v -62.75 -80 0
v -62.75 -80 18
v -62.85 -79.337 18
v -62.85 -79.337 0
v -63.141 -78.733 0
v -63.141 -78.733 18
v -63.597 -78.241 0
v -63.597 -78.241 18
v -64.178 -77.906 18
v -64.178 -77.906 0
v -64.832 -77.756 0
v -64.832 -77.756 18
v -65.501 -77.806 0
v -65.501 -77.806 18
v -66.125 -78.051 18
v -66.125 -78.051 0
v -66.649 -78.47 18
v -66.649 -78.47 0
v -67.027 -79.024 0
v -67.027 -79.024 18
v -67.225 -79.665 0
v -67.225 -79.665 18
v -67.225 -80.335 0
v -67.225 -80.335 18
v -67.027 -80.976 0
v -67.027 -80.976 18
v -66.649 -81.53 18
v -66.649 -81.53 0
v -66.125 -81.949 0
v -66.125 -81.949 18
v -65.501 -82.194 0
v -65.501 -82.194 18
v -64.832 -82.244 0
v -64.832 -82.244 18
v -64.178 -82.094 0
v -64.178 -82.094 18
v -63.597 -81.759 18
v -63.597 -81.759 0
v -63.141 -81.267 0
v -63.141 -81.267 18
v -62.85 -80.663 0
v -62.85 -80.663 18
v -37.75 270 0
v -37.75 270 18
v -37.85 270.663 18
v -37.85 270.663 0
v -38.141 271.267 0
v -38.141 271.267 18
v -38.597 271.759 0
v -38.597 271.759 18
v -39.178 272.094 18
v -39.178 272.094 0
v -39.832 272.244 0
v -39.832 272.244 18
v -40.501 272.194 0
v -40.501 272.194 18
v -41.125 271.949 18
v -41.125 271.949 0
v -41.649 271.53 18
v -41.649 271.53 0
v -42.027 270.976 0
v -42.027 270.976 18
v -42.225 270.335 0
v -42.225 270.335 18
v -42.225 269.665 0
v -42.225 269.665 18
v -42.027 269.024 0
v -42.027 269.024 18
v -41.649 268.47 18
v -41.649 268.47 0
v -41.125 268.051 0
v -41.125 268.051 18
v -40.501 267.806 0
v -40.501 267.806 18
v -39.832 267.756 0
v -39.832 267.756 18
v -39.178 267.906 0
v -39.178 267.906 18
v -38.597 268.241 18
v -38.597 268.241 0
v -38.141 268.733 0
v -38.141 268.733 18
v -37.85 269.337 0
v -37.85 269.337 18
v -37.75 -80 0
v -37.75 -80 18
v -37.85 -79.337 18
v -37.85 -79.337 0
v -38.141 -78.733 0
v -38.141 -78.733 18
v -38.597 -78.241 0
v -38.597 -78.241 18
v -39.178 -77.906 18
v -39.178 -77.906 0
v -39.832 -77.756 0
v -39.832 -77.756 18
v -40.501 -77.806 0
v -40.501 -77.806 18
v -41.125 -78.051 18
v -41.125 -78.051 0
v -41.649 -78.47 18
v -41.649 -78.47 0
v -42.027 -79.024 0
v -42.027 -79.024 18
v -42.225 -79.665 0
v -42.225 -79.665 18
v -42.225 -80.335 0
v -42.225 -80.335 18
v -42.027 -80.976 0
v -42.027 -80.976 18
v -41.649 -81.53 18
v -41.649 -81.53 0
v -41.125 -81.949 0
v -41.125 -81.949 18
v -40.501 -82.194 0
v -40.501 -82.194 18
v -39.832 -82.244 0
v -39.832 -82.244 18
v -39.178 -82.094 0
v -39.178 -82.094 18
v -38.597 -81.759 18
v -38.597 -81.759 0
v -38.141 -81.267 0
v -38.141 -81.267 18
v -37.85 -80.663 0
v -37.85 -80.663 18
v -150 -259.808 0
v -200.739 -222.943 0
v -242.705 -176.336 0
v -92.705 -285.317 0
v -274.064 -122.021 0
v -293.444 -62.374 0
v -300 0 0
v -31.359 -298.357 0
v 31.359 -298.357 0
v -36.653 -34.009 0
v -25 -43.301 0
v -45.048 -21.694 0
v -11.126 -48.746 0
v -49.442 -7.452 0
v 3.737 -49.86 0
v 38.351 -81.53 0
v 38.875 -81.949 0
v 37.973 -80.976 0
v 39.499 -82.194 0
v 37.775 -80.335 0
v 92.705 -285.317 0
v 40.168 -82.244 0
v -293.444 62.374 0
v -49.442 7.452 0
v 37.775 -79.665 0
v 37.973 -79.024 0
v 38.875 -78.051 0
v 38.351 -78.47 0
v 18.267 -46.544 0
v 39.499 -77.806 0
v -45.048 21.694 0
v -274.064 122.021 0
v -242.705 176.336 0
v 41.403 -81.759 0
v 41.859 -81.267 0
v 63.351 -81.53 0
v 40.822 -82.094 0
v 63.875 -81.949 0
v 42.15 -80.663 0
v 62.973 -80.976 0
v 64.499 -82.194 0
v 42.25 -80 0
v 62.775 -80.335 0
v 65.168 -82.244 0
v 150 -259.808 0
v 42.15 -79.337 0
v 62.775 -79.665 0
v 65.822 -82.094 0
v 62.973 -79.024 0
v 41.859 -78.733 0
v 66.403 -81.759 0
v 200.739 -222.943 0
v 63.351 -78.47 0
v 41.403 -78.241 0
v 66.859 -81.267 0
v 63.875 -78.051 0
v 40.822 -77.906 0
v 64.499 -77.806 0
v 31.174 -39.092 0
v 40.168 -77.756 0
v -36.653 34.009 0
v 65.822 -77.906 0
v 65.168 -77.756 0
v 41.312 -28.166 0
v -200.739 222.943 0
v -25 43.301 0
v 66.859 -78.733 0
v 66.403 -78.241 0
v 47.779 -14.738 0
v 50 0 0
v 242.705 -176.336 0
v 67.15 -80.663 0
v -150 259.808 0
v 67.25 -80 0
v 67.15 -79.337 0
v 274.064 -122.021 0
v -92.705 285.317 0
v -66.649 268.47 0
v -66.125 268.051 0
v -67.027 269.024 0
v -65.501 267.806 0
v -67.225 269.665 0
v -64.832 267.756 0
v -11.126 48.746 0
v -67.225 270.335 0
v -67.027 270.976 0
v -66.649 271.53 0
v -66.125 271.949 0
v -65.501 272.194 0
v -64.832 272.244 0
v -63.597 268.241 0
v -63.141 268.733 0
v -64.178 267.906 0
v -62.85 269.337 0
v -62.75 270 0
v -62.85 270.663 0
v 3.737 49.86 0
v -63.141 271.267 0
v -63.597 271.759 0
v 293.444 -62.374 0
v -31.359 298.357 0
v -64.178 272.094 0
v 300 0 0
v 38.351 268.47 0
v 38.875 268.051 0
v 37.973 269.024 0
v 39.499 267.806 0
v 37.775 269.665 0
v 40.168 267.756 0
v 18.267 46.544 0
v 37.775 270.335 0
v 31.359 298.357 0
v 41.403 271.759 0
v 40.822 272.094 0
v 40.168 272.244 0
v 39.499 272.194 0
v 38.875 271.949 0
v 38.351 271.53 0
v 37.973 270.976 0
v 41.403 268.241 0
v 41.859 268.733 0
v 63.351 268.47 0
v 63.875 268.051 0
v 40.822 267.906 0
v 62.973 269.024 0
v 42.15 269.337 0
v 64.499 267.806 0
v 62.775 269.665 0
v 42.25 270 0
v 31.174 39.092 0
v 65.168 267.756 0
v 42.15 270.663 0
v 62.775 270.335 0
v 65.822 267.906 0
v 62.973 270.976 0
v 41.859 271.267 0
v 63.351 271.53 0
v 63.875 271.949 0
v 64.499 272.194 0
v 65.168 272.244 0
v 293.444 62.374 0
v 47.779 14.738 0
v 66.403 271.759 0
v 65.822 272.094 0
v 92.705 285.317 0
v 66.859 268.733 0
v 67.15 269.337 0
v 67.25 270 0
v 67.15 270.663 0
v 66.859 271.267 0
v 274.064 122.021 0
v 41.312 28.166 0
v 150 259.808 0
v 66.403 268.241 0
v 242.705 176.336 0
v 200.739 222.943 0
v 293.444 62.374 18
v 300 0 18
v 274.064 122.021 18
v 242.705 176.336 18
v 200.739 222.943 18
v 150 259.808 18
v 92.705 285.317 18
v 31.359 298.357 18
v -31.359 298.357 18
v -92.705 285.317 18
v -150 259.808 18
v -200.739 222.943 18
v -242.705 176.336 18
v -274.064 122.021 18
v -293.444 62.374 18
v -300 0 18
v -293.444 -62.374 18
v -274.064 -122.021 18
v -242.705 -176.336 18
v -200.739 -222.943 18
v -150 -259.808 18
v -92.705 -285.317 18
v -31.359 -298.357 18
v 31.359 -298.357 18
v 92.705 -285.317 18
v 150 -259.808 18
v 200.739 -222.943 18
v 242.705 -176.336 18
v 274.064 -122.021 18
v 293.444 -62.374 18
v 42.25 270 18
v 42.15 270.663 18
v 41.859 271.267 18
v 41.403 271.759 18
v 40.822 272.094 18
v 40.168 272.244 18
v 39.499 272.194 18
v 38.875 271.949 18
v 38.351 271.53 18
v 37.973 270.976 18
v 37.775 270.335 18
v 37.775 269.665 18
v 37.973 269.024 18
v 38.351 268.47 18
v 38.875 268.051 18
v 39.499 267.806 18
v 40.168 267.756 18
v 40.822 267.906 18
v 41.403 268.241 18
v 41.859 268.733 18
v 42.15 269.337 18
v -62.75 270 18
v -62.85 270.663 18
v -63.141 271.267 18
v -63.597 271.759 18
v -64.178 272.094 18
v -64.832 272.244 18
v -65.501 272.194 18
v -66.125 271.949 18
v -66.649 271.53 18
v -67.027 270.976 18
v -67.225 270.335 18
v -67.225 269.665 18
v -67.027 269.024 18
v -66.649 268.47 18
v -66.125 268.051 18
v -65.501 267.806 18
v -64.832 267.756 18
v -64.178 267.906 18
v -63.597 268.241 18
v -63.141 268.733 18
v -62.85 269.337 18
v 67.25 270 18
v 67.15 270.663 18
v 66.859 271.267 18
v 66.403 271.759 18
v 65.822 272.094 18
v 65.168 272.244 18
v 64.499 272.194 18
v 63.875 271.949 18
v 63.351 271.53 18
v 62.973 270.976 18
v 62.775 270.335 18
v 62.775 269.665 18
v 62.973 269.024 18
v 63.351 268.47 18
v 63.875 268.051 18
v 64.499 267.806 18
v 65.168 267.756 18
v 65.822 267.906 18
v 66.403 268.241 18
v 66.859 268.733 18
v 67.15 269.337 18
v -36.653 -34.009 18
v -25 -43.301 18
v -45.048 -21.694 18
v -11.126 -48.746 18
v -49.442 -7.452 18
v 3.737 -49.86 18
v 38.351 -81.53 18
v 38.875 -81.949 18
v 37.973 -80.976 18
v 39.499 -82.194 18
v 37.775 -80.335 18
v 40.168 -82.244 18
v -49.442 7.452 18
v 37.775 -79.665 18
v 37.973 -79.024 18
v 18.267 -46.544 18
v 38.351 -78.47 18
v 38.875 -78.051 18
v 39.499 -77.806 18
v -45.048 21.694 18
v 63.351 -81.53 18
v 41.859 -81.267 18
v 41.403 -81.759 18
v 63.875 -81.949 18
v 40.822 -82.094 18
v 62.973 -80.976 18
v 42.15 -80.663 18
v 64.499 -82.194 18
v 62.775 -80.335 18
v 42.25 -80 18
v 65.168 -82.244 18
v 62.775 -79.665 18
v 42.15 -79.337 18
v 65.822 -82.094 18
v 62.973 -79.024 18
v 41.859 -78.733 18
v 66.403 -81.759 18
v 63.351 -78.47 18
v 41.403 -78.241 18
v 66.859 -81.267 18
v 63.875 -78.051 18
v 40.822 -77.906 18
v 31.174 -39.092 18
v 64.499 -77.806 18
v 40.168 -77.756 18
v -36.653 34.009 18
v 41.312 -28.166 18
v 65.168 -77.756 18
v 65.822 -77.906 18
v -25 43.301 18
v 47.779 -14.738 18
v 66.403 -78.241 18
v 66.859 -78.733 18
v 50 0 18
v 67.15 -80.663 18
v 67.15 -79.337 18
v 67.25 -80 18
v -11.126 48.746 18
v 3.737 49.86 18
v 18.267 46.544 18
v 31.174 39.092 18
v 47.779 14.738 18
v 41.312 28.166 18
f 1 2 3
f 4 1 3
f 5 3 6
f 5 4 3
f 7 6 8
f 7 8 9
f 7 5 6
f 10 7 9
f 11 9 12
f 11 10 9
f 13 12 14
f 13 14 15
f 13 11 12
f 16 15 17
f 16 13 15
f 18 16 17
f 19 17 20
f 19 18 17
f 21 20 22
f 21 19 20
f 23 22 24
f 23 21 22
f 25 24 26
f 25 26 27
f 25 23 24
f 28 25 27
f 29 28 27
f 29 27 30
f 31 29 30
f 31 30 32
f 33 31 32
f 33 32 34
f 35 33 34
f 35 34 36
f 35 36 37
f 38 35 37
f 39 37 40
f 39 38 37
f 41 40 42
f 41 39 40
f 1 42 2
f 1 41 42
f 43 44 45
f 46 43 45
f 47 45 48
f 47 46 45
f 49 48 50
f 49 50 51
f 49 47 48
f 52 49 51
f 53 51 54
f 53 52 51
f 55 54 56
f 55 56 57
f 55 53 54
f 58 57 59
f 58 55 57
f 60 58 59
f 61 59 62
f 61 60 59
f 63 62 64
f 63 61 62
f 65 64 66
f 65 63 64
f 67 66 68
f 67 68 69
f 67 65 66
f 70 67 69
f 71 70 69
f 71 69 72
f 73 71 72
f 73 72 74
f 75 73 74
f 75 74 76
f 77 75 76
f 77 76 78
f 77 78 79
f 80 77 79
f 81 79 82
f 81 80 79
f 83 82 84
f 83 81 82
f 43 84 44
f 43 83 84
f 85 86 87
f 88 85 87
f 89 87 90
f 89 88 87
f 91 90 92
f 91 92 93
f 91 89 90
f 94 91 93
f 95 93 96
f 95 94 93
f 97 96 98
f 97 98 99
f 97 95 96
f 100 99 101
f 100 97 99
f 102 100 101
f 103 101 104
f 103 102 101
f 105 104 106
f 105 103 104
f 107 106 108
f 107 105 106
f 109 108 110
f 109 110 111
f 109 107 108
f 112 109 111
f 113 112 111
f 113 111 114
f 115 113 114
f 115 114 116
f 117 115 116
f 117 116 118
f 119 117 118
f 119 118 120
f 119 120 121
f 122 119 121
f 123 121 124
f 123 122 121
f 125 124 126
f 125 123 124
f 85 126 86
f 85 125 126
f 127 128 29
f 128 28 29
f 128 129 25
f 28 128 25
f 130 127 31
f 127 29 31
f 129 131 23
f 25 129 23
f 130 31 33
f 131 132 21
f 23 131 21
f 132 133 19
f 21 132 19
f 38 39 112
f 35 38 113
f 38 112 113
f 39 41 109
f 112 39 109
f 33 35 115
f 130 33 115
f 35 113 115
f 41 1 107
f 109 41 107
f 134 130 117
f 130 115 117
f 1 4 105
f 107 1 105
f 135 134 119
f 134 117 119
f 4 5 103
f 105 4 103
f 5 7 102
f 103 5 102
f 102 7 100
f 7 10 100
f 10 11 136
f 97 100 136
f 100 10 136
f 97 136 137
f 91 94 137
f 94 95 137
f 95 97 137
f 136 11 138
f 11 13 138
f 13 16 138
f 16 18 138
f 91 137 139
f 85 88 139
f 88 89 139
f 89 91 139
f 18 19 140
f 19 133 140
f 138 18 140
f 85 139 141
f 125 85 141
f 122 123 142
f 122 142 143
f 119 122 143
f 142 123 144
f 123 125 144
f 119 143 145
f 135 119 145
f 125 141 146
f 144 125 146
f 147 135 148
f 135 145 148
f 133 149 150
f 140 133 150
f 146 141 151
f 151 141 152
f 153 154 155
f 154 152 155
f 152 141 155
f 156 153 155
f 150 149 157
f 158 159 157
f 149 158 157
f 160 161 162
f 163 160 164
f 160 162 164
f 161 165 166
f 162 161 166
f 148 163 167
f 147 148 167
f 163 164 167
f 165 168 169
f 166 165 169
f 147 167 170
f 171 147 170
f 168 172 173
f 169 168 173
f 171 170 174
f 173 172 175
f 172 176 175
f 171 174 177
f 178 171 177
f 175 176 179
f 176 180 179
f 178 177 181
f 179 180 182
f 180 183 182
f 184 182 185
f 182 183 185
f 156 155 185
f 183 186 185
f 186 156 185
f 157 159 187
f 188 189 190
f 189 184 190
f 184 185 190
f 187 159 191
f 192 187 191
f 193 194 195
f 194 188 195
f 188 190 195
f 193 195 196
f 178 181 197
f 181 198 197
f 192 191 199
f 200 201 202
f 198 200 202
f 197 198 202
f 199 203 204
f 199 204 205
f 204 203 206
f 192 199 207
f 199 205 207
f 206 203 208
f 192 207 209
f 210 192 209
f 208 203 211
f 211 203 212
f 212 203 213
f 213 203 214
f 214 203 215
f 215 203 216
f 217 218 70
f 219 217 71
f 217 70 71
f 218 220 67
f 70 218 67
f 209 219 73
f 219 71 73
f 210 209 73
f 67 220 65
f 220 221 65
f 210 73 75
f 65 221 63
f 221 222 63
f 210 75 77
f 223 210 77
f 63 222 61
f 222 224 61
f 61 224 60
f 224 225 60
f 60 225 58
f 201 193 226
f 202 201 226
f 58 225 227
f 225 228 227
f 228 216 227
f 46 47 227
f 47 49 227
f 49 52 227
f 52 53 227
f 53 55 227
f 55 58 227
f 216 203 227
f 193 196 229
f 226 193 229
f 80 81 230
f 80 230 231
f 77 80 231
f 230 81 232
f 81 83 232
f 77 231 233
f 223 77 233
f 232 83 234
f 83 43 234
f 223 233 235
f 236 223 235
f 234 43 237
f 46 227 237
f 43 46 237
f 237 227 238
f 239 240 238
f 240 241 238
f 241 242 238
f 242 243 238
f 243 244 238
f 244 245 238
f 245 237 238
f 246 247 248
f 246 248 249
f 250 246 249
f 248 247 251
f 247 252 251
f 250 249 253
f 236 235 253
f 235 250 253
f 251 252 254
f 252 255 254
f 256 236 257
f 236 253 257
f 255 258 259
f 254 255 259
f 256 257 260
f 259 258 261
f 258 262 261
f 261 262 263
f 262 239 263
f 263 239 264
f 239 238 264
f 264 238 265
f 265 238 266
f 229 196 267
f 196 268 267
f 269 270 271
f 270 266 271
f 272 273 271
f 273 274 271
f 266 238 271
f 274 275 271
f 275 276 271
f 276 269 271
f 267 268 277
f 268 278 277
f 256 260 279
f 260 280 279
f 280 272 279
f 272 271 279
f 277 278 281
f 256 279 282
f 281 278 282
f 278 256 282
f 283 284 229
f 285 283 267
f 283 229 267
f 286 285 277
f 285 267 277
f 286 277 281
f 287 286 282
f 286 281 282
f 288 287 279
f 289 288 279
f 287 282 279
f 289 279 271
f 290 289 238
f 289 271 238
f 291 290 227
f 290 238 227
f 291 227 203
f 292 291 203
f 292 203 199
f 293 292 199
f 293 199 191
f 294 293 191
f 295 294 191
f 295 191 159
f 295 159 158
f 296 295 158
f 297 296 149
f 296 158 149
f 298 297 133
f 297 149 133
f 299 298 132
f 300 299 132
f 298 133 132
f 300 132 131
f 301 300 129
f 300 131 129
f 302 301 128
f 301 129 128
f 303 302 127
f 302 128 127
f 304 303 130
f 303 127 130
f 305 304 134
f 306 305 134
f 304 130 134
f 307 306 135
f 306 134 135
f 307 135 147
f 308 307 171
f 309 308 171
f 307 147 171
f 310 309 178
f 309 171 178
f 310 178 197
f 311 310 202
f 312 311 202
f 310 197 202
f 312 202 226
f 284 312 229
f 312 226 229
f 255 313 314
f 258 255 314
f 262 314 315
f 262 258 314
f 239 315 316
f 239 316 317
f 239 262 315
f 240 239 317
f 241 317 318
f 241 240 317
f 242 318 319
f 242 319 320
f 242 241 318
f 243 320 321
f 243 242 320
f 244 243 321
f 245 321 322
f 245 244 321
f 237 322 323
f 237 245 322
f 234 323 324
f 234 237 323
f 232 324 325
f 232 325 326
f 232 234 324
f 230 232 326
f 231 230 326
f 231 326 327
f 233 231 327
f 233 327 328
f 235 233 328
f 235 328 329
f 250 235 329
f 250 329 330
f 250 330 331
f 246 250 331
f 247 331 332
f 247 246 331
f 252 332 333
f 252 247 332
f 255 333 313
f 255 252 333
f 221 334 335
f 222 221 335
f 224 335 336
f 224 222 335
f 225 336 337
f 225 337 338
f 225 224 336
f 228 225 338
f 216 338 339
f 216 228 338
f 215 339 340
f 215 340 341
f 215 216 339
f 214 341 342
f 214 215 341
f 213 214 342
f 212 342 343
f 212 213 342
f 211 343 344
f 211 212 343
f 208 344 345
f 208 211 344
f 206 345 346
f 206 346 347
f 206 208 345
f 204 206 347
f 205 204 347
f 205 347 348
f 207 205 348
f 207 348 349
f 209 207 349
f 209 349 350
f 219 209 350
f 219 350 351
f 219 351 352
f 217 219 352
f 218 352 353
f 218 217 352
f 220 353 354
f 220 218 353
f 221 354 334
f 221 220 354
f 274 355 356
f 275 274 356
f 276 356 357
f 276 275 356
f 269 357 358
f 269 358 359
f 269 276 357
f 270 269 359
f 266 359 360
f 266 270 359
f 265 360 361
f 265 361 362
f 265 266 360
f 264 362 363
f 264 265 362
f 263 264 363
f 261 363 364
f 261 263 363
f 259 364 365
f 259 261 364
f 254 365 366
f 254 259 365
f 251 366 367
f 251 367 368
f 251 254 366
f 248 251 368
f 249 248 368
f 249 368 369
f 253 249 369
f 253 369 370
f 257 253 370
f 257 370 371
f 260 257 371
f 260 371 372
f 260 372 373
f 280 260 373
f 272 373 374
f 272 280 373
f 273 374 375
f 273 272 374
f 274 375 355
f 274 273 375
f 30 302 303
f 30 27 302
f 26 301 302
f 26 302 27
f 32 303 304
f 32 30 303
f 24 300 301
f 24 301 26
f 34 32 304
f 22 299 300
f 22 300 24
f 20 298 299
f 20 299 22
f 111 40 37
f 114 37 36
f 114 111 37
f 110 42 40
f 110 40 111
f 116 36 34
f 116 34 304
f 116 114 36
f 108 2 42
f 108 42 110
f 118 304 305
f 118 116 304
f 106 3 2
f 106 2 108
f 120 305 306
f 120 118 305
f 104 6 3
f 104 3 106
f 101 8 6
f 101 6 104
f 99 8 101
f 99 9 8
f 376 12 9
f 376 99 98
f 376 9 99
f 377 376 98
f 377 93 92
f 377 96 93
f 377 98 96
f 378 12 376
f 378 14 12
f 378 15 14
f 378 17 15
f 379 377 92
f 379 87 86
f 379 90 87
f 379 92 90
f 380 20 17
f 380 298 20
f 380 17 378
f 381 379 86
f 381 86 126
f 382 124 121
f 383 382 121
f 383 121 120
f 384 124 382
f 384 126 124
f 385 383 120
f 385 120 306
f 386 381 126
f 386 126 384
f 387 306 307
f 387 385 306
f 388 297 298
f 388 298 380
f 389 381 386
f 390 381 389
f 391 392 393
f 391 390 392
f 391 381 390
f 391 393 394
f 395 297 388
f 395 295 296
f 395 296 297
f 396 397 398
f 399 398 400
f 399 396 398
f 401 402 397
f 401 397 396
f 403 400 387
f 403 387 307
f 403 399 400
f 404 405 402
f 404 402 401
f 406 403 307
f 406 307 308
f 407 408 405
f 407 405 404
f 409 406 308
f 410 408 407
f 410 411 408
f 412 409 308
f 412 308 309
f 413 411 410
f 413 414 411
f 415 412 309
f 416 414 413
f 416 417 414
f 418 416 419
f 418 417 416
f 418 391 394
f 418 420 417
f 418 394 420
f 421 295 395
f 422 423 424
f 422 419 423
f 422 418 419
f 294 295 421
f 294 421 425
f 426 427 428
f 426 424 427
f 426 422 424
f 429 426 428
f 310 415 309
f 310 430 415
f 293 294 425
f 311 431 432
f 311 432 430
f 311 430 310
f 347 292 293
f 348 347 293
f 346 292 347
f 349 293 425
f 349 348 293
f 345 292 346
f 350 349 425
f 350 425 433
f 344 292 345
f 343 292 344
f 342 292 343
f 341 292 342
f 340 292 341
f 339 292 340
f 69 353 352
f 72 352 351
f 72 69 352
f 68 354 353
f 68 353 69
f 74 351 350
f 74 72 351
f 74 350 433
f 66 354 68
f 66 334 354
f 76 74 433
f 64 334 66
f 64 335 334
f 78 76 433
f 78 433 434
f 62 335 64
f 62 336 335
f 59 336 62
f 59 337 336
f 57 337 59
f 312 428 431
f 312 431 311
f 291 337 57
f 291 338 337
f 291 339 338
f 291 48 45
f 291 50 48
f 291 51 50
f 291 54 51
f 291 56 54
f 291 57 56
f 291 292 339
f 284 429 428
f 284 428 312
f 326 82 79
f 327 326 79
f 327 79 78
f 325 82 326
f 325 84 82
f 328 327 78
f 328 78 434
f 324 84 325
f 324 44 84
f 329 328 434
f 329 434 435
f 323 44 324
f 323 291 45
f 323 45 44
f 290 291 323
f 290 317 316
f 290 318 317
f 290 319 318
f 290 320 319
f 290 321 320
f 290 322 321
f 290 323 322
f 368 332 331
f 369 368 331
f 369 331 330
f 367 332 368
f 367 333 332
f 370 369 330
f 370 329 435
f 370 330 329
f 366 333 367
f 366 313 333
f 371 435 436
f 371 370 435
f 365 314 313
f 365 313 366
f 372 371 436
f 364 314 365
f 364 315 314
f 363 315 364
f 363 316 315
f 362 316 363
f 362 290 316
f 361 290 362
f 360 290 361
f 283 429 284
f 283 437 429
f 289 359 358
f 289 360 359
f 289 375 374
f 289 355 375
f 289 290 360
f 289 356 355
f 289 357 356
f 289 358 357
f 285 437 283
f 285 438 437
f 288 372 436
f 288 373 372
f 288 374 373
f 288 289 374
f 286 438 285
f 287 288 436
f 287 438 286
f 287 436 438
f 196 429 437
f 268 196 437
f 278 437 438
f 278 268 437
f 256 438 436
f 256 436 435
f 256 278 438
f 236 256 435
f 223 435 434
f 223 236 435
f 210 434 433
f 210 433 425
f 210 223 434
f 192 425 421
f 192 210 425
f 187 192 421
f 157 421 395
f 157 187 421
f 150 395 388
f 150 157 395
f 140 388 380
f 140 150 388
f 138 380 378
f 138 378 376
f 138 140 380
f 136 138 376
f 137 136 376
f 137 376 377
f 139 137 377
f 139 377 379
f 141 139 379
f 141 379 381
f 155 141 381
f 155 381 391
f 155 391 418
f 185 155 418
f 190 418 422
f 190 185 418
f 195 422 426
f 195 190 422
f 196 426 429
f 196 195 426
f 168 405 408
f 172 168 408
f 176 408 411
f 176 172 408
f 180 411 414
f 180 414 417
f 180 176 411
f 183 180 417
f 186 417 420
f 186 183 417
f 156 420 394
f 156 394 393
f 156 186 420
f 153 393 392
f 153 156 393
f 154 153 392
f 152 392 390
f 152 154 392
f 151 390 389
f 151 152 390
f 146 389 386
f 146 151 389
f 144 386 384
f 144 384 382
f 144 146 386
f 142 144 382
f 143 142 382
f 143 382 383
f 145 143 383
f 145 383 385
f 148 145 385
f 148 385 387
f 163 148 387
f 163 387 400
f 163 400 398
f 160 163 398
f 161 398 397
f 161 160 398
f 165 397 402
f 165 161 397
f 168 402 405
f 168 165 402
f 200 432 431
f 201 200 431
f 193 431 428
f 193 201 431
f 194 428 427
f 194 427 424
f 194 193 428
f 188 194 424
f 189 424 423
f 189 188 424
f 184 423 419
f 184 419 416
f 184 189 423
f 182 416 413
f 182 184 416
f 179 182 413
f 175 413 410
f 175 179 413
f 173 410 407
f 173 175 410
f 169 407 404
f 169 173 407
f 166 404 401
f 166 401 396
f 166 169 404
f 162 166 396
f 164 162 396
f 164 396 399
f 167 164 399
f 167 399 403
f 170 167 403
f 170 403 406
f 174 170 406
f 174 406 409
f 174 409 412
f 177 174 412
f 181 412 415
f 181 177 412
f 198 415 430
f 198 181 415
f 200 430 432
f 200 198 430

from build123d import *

# Parameters (mm, degrees)
F0_R     = 300
F0_R_2   = 2.25
F0_R_3   = 50
F1_DEPTH = 18


with BuildPart() as f1:
    # F0 (on Top) → F1 (new body)
    with BuildSketch(Plane.XY):
        Circle(F0_R)
        with Locations((-65, -80)):
            Circle(F0_R_2, mode=Mode.SUBTRACT)
        with Locations((-40, -80)):
            Circle(F0_R_2, mode=Mode.SUBTRACT)
        with Locations((40, -80)):
            Circle(F0_R_2, mode=Mode.SUBTRACT)
        with Locations((65, -80)):
            Circle(F0_R_2, mode=Mode.SUBTRACT)
        with Locations((-65, 270)):
            Circle(F0_R_2, mode=Mode.SUBTRACT)
        with Locations((-40, 270)):
            Circle(F0_R_2, mode=Mode.SUBTRACT)
        Circle(F0_R_3, mode=Mode.SUBTRACT)
        with Locations((40, 270)):
            Circle(F0_R_2, mode=Mode.SUBTRACT)
        with Locations((65, 270)):
            Circle(F0_R_2, mode=Mode.SUBTRACT)
    extrude(amount=F1_DEPTH)


solid = f1.part
